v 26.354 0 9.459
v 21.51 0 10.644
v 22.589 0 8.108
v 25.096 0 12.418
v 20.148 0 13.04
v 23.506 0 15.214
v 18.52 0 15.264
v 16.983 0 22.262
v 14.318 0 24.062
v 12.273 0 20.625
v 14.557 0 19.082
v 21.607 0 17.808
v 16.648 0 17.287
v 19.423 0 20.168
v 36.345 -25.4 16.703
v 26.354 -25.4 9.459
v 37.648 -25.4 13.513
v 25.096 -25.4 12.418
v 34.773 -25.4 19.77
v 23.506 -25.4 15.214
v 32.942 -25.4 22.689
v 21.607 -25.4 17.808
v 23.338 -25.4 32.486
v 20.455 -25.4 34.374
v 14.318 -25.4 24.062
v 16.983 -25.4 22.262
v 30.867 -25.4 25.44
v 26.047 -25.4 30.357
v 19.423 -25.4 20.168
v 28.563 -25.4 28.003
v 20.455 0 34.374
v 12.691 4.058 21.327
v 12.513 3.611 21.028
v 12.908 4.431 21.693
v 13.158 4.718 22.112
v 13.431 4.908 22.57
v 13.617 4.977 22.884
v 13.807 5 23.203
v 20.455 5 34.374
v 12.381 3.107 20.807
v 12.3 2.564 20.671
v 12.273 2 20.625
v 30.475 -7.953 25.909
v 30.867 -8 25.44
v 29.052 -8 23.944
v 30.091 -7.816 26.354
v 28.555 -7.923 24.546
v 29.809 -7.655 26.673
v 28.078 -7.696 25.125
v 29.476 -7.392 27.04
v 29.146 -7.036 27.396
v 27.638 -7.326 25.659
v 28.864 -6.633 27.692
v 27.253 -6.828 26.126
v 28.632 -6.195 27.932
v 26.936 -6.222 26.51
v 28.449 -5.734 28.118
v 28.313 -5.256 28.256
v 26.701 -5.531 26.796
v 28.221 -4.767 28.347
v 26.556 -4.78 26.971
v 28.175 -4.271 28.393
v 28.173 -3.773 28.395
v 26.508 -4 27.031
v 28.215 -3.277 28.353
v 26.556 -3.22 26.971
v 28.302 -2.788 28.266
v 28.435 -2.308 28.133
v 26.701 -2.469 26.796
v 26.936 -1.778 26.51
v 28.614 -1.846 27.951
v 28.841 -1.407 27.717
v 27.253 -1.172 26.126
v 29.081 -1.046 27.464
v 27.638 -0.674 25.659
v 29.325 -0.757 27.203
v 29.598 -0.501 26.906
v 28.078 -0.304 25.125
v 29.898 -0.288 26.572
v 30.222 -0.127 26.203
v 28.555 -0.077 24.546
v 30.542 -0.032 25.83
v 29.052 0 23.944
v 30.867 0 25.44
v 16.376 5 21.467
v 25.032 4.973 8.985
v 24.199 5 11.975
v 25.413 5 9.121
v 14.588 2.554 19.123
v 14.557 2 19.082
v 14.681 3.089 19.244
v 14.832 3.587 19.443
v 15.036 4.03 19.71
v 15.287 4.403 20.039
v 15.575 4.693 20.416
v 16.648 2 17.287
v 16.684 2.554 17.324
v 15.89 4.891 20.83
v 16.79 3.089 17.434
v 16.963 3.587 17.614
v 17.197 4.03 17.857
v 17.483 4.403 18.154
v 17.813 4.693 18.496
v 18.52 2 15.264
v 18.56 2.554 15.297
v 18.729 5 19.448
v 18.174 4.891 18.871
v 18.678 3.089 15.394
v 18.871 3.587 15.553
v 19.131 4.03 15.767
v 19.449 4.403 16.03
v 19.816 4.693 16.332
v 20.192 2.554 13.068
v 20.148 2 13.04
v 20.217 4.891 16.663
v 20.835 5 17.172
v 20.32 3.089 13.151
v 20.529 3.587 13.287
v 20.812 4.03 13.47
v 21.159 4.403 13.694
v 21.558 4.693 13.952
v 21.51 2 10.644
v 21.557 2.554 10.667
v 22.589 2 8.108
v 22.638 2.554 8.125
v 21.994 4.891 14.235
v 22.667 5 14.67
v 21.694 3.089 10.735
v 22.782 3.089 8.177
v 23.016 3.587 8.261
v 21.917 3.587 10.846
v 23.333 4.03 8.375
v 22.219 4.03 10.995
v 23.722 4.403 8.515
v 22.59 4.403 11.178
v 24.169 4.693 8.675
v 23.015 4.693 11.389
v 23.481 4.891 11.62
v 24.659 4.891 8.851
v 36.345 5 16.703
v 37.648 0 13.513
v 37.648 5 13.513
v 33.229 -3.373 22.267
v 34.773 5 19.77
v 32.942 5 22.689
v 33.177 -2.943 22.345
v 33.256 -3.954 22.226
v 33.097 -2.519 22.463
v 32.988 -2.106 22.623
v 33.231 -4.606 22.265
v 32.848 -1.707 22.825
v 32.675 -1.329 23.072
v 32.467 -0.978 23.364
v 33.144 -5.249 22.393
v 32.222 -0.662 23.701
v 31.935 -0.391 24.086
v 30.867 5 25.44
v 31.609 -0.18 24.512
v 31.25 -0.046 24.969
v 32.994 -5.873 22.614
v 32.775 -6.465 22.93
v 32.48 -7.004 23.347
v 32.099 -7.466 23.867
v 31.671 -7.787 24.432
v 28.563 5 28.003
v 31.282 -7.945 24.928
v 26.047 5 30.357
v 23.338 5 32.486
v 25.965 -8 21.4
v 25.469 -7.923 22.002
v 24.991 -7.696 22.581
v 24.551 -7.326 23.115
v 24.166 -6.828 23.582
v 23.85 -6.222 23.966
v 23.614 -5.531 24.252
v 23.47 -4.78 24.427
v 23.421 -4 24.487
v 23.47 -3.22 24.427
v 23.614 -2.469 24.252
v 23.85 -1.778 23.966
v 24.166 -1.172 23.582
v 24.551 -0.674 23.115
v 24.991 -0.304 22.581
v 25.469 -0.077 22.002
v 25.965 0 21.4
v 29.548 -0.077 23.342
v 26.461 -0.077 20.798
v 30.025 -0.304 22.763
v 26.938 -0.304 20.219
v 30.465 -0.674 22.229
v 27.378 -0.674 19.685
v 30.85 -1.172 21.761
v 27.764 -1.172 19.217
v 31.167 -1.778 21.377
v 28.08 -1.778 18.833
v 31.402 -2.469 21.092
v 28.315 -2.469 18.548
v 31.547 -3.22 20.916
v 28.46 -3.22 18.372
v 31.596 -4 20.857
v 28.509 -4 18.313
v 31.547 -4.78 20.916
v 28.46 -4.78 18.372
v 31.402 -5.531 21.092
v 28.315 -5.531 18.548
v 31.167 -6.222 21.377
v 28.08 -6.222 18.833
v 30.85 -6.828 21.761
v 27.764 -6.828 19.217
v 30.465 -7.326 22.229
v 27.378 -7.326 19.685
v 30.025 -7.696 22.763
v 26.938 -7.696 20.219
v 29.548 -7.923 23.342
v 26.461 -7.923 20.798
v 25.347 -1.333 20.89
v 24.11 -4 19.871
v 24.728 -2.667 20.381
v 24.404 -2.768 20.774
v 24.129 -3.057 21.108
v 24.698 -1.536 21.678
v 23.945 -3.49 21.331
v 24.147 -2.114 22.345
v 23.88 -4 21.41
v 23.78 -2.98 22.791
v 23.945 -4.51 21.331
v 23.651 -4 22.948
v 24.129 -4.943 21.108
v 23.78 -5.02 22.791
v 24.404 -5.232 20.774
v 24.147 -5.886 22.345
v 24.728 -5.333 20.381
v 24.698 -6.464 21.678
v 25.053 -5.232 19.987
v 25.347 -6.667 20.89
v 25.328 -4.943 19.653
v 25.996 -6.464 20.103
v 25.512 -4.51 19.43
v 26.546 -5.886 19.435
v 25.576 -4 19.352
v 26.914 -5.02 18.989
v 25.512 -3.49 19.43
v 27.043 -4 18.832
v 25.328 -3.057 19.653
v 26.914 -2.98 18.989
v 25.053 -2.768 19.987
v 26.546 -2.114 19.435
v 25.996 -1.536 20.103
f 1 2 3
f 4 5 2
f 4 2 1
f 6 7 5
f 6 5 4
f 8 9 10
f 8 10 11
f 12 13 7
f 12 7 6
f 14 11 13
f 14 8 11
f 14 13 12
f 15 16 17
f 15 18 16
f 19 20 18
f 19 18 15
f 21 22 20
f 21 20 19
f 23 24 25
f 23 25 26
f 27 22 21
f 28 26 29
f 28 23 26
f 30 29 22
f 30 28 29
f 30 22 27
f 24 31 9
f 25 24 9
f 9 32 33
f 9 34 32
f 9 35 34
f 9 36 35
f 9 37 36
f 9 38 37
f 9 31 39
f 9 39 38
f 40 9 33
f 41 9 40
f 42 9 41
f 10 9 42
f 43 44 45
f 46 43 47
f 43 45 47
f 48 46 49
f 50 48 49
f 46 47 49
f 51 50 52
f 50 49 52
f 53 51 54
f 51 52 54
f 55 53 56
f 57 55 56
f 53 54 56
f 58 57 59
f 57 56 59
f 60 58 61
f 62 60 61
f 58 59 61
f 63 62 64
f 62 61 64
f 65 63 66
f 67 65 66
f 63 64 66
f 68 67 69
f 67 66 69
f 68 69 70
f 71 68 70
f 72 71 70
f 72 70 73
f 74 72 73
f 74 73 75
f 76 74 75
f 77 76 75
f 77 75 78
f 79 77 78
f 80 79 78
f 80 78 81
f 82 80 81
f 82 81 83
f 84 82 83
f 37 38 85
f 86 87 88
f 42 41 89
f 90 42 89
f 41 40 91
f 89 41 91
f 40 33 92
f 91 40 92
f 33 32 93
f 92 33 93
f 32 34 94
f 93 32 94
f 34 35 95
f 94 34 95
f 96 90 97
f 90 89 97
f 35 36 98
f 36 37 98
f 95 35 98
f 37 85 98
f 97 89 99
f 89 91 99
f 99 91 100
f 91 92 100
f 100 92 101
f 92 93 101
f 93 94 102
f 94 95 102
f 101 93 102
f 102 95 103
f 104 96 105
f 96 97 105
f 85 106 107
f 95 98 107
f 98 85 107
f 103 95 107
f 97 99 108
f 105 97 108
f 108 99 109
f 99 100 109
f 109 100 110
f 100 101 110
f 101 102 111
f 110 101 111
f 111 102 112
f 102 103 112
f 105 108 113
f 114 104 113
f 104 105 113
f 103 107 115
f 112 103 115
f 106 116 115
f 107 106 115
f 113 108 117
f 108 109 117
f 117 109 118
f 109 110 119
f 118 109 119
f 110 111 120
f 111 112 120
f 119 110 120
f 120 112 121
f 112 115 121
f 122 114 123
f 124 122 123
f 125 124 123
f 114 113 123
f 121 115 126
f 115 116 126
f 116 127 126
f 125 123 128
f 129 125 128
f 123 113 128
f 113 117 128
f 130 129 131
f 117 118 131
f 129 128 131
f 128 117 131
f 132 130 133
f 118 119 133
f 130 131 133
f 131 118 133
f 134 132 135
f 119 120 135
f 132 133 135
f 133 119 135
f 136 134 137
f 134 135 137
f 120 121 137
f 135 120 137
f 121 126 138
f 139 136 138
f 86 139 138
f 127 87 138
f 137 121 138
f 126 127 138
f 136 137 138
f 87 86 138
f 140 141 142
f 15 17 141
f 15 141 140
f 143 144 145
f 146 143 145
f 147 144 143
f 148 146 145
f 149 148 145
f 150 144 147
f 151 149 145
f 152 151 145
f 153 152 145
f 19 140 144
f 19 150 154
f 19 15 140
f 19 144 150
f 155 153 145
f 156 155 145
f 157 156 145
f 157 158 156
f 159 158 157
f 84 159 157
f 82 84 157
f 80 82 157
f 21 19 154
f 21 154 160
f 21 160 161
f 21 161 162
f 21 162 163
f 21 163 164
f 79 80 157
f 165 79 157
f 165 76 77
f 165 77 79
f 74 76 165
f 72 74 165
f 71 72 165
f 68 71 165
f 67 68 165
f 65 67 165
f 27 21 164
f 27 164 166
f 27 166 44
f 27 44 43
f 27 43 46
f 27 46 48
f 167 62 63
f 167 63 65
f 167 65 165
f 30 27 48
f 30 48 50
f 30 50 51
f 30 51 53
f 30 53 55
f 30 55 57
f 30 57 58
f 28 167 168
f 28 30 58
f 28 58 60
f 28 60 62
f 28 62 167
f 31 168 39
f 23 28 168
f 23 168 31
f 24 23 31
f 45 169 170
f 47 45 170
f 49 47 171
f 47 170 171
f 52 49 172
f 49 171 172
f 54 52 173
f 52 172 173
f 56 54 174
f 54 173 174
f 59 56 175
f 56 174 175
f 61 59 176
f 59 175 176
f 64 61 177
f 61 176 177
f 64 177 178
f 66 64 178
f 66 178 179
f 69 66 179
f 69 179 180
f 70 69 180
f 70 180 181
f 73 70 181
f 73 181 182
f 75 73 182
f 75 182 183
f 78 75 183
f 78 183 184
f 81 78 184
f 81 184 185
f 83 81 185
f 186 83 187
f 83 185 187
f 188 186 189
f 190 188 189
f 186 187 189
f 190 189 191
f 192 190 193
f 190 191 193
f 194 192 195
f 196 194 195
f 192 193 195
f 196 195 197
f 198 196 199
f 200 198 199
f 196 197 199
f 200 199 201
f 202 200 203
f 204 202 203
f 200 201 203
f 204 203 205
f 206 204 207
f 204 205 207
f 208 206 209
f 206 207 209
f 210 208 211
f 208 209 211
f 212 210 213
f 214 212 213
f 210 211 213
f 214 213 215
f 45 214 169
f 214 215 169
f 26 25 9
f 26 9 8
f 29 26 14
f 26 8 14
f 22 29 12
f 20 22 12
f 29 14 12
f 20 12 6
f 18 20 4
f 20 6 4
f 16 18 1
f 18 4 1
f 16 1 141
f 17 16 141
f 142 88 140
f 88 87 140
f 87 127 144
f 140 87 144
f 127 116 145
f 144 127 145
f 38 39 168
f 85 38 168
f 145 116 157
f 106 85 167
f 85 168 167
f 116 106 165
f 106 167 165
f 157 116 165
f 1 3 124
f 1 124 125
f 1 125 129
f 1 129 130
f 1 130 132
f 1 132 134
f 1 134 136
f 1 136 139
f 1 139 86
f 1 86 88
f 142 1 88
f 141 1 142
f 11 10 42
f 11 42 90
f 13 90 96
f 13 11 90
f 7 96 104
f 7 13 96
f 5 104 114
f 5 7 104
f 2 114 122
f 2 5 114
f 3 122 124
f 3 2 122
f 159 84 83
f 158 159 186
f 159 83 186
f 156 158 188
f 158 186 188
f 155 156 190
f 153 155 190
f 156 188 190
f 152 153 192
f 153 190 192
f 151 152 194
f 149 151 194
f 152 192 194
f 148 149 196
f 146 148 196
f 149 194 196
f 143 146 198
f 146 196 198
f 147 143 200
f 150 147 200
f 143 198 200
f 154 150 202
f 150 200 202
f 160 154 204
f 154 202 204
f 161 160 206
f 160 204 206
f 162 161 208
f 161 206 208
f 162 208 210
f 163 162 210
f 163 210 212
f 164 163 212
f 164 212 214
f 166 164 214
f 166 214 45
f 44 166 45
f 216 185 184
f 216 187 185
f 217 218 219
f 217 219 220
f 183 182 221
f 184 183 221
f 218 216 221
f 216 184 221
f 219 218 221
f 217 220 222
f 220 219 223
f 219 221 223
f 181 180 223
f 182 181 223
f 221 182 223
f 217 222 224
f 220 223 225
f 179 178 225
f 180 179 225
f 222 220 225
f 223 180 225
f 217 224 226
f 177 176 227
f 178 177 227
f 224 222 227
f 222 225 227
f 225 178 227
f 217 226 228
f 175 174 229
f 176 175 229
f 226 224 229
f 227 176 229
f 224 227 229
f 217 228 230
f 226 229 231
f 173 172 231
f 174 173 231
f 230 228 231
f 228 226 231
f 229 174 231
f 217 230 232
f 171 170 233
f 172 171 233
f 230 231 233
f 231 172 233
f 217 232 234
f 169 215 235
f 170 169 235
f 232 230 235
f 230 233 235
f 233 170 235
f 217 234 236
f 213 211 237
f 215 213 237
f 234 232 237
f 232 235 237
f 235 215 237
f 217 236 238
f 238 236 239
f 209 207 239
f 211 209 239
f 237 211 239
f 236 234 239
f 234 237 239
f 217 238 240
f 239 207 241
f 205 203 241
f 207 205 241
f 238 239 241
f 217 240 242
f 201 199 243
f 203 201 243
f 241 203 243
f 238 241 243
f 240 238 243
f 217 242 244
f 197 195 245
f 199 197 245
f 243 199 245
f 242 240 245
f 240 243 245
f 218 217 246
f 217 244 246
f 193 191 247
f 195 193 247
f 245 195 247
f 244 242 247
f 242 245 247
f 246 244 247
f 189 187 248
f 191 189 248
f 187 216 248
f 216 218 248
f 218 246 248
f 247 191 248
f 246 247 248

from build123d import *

# Parameters (mm, degrees)
F2_DEPTH = 25.4
F3_DEPTH = 5
F6_D     = 8
F6_DEPTH = 5
F6_TIP   = 2.4034424761
F7_D     = 8
F7_DEPTH = 4
F7_TIP   = 2.4034424761
F8_R     = 3


with BuildPart() as f2:
    # F0 (on Front) → F2 (new body)
    with BuildSketch(Plane.XZ):
        with BuildLine():
            Line((26.353785117, 9.4592816856), (37.6482644529, 13.5132595508))
            ThreePointArc((37.6482644529, 13.5132595508), (30.8672872021, 25.4403337396), (20.4548362885, 34.3744043208))
            Line((20.4548362885, 34.3744043208), (14.3183854019, 24.0620830246))
            ThreePointArc((14.3183854019, 24.0620830246), (21.6071010415, 17.8082336177), (26.353785117, 9.4592816856))
        make_face()
    extrude(amount=F2_DEPTH)

    # F1 (on Front) + F0 (on Front) → F3 (join)
    with BuildSketch(Plane.XZ):
        with BuildLine():
            ThreePointArc((12.2729017731, 20.6246425925), (18.5203723213, 15.2642002437), (22.5889586717, 8.1079557305))
            Line((22.5889586717, 8.1079557305), (37.6482644529, 13.5132595508))
            ThreePointArc((37.6482644529, 13.5132595508), (30.8672872021, 25.4403337396), (20.4548362885, 34.3744043208))
            Line((20.4548362885, 34.3744043208), (12.2729017731, 20.6246425925))
        make_face()
    with BuildSketch(Plane.XZ):
        with BuildLine():
            Line((26.353785117, 9.4592816856), (37.6482644529, 13.5132595508))
            ThreePointArc((37.6482644529, 13.5132595508), (30.8672872021, 25.4403337396), (20.4548362885, 34.3744043208))
            Line((20.4548362885, 34.3744043208), (14.3183854019, 24.0620830246))
            ThreePointArc((14.3183854019, 24.0620830246), (21.6071010415, 17.8082336177), (26.353785117, 9.4592816856))
        make_face()
    extrude(amount=-F3_DEPTH)

    # F6 (one way)
    with BuildSketch(Plane(origin=(29.0515503707, 0, 23.9438319358), x_dir=(0, 1, 0), z_dir=(-0.7716821801, 0, -0.6360083435))):
        with Locations((-4, 0)):
            Circle(F6_D / 2)
    extrude(amount=-F6_DEPTH, mode=Mode.SUBTRACT)
    with Locations(Plane(origin=(29.0515503707, 0, 23.9438319358), x_dir=(0, 1, 0), z_dir=(-0.7716821801, 0, -0.6360083435))):
        with Locations((-4, 0)):
            with Locations((0, 0, -(F6_DEPTH + F6_TIP / 2))):  # 118° drill point
                Cone(0, F6_D / 2, F6_TIP, mode=Mode.SUBTRACT)

    # F7
    with Locations(Plane(origin=(29.0515503707, 0, 23.9438319358), x_dir=(0, 1, 0), z_dir=(0.7716821801, 0, 0.6360083435))):
        with Locations((-4, 0)):
            Hole(F7_D / 2, depth=F7_DEPTH)
            with Locations((0, 0, -(F7_DEPTH + F7_TIP / 2))):  # 118° drill point
                Cone(0, F7_D / 2, F7_TIP, mode=Mode.SUBTRACT)

    # F8
    f8_edges = [f2.edges().sort_by_distance(p)[0] for p in [
        (18.520372, 5, 15.2642),
    ]]
    fillet(f8_edges, radius=F8_R)


solid = f2.part
